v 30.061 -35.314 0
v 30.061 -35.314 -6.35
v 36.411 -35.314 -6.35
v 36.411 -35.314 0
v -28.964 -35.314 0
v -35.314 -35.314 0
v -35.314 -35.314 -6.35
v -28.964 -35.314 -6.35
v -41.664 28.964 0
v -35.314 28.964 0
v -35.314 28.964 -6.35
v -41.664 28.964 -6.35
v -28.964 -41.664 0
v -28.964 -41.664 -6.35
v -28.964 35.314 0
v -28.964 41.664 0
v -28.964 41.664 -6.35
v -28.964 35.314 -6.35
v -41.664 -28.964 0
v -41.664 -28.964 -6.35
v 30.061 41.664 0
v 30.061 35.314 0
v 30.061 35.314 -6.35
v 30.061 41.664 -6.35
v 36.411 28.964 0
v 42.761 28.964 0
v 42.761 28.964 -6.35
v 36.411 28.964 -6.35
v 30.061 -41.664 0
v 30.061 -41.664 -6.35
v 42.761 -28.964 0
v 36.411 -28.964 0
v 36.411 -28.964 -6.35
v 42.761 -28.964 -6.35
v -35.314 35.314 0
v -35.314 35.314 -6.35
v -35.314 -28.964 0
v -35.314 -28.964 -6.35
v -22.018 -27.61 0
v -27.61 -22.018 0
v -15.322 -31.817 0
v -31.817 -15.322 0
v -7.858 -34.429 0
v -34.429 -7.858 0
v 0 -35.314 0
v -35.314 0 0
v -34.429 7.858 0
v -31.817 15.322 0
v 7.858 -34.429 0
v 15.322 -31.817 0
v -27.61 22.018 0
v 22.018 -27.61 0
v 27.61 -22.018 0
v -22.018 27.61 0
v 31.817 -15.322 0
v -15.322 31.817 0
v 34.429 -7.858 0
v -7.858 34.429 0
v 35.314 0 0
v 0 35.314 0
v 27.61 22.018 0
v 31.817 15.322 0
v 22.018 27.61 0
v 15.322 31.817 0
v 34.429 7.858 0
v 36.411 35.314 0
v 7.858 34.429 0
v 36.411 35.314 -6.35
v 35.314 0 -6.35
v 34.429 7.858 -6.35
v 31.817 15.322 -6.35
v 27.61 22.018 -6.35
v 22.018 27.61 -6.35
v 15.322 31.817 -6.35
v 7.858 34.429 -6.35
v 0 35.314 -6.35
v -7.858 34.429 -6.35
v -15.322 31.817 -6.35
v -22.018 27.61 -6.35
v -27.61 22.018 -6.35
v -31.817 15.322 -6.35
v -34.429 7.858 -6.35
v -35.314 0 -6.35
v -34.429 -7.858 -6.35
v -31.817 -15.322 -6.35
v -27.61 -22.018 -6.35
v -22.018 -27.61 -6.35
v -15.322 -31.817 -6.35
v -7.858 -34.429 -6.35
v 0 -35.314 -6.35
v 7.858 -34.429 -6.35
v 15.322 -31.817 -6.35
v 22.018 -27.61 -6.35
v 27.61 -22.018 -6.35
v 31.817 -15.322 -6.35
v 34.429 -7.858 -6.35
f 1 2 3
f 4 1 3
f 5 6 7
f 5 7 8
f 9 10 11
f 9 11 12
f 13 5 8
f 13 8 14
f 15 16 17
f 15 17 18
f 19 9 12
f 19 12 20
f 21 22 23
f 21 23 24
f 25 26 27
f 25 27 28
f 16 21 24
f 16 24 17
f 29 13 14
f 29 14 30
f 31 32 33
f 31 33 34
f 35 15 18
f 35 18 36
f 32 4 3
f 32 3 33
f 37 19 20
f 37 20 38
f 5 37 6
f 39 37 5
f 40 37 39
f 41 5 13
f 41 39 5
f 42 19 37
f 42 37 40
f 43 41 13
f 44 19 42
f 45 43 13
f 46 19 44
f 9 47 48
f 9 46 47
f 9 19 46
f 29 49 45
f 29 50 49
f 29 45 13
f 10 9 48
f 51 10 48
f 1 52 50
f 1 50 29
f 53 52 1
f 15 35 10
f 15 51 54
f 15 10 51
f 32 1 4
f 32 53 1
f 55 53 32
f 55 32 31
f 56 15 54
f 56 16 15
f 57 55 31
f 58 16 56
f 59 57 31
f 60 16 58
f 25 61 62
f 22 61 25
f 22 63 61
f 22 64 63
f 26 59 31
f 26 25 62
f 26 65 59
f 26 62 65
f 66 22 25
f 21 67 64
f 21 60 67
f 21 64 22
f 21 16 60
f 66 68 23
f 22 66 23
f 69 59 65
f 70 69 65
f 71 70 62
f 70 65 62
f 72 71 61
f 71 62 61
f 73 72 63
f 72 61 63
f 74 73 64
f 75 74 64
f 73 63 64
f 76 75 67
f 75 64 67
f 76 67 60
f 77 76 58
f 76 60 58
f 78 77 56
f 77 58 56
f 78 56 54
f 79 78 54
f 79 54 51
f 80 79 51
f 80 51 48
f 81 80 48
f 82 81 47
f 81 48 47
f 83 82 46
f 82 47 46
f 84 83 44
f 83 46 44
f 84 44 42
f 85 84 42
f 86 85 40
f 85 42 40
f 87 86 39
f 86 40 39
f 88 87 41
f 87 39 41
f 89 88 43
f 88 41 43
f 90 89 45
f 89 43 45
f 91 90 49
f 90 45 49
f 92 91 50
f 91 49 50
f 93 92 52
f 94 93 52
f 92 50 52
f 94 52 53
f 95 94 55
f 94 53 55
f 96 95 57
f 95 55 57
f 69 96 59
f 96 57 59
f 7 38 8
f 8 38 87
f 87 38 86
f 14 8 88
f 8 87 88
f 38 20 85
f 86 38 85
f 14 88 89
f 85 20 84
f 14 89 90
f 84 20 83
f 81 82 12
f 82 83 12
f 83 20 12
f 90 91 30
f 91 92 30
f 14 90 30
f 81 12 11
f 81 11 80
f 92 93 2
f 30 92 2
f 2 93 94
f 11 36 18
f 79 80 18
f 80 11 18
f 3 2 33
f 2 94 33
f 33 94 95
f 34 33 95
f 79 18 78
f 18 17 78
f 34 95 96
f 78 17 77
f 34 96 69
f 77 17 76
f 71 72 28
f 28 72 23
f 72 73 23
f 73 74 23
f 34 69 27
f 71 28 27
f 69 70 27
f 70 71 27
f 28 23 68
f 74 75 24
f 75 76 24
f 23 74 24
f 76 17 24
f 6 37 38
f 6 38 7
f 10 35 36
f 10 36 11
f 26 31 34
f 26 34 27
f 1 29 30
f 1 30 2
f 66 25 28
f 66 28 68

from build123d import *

# Parameters (mm, degrees)
SKETCH1_R           = 35.3139375
BOSS_EXTRUDE1_DEPTH = 6.35


with BuildPart() as part:
    # Sketch1 → Boss-Extrude1 (new body)
    with BuildSketch(Plane.XY):
        Polygon((36.4109, 35.3139375), (30.0609, 35.3139375), (30.0609, 41.6639375), (-28.9639375, 41.6639375), (-28.9639375, 35.3139375), (-35.3139375, 35.3139375), (-35.3139375, 28.9639375), (-41.6639375, 28.9639375), (-41.6639375, -28.9639375), (-35.3139375, -28.9639375), (-35.3139375, -35.3139375), (-28.9639375, -35.3139375), (-28.9639375, -41.6639375), (30.0609, -41.6639375), (30.0609, -35.3139375), (36.4109, -35.3139375), (36.4109, -28.9639375), (42.7609, -28.9639375), (42.7609, 28.9639375), (36.4109, 28.9639375), align=None)
        Circle(SKETCH1_R, mode=Mode.SUBTRACT)
    extrude(amount=-BOSS_EXTRUDE1_DEPTH)


solid = part.part
